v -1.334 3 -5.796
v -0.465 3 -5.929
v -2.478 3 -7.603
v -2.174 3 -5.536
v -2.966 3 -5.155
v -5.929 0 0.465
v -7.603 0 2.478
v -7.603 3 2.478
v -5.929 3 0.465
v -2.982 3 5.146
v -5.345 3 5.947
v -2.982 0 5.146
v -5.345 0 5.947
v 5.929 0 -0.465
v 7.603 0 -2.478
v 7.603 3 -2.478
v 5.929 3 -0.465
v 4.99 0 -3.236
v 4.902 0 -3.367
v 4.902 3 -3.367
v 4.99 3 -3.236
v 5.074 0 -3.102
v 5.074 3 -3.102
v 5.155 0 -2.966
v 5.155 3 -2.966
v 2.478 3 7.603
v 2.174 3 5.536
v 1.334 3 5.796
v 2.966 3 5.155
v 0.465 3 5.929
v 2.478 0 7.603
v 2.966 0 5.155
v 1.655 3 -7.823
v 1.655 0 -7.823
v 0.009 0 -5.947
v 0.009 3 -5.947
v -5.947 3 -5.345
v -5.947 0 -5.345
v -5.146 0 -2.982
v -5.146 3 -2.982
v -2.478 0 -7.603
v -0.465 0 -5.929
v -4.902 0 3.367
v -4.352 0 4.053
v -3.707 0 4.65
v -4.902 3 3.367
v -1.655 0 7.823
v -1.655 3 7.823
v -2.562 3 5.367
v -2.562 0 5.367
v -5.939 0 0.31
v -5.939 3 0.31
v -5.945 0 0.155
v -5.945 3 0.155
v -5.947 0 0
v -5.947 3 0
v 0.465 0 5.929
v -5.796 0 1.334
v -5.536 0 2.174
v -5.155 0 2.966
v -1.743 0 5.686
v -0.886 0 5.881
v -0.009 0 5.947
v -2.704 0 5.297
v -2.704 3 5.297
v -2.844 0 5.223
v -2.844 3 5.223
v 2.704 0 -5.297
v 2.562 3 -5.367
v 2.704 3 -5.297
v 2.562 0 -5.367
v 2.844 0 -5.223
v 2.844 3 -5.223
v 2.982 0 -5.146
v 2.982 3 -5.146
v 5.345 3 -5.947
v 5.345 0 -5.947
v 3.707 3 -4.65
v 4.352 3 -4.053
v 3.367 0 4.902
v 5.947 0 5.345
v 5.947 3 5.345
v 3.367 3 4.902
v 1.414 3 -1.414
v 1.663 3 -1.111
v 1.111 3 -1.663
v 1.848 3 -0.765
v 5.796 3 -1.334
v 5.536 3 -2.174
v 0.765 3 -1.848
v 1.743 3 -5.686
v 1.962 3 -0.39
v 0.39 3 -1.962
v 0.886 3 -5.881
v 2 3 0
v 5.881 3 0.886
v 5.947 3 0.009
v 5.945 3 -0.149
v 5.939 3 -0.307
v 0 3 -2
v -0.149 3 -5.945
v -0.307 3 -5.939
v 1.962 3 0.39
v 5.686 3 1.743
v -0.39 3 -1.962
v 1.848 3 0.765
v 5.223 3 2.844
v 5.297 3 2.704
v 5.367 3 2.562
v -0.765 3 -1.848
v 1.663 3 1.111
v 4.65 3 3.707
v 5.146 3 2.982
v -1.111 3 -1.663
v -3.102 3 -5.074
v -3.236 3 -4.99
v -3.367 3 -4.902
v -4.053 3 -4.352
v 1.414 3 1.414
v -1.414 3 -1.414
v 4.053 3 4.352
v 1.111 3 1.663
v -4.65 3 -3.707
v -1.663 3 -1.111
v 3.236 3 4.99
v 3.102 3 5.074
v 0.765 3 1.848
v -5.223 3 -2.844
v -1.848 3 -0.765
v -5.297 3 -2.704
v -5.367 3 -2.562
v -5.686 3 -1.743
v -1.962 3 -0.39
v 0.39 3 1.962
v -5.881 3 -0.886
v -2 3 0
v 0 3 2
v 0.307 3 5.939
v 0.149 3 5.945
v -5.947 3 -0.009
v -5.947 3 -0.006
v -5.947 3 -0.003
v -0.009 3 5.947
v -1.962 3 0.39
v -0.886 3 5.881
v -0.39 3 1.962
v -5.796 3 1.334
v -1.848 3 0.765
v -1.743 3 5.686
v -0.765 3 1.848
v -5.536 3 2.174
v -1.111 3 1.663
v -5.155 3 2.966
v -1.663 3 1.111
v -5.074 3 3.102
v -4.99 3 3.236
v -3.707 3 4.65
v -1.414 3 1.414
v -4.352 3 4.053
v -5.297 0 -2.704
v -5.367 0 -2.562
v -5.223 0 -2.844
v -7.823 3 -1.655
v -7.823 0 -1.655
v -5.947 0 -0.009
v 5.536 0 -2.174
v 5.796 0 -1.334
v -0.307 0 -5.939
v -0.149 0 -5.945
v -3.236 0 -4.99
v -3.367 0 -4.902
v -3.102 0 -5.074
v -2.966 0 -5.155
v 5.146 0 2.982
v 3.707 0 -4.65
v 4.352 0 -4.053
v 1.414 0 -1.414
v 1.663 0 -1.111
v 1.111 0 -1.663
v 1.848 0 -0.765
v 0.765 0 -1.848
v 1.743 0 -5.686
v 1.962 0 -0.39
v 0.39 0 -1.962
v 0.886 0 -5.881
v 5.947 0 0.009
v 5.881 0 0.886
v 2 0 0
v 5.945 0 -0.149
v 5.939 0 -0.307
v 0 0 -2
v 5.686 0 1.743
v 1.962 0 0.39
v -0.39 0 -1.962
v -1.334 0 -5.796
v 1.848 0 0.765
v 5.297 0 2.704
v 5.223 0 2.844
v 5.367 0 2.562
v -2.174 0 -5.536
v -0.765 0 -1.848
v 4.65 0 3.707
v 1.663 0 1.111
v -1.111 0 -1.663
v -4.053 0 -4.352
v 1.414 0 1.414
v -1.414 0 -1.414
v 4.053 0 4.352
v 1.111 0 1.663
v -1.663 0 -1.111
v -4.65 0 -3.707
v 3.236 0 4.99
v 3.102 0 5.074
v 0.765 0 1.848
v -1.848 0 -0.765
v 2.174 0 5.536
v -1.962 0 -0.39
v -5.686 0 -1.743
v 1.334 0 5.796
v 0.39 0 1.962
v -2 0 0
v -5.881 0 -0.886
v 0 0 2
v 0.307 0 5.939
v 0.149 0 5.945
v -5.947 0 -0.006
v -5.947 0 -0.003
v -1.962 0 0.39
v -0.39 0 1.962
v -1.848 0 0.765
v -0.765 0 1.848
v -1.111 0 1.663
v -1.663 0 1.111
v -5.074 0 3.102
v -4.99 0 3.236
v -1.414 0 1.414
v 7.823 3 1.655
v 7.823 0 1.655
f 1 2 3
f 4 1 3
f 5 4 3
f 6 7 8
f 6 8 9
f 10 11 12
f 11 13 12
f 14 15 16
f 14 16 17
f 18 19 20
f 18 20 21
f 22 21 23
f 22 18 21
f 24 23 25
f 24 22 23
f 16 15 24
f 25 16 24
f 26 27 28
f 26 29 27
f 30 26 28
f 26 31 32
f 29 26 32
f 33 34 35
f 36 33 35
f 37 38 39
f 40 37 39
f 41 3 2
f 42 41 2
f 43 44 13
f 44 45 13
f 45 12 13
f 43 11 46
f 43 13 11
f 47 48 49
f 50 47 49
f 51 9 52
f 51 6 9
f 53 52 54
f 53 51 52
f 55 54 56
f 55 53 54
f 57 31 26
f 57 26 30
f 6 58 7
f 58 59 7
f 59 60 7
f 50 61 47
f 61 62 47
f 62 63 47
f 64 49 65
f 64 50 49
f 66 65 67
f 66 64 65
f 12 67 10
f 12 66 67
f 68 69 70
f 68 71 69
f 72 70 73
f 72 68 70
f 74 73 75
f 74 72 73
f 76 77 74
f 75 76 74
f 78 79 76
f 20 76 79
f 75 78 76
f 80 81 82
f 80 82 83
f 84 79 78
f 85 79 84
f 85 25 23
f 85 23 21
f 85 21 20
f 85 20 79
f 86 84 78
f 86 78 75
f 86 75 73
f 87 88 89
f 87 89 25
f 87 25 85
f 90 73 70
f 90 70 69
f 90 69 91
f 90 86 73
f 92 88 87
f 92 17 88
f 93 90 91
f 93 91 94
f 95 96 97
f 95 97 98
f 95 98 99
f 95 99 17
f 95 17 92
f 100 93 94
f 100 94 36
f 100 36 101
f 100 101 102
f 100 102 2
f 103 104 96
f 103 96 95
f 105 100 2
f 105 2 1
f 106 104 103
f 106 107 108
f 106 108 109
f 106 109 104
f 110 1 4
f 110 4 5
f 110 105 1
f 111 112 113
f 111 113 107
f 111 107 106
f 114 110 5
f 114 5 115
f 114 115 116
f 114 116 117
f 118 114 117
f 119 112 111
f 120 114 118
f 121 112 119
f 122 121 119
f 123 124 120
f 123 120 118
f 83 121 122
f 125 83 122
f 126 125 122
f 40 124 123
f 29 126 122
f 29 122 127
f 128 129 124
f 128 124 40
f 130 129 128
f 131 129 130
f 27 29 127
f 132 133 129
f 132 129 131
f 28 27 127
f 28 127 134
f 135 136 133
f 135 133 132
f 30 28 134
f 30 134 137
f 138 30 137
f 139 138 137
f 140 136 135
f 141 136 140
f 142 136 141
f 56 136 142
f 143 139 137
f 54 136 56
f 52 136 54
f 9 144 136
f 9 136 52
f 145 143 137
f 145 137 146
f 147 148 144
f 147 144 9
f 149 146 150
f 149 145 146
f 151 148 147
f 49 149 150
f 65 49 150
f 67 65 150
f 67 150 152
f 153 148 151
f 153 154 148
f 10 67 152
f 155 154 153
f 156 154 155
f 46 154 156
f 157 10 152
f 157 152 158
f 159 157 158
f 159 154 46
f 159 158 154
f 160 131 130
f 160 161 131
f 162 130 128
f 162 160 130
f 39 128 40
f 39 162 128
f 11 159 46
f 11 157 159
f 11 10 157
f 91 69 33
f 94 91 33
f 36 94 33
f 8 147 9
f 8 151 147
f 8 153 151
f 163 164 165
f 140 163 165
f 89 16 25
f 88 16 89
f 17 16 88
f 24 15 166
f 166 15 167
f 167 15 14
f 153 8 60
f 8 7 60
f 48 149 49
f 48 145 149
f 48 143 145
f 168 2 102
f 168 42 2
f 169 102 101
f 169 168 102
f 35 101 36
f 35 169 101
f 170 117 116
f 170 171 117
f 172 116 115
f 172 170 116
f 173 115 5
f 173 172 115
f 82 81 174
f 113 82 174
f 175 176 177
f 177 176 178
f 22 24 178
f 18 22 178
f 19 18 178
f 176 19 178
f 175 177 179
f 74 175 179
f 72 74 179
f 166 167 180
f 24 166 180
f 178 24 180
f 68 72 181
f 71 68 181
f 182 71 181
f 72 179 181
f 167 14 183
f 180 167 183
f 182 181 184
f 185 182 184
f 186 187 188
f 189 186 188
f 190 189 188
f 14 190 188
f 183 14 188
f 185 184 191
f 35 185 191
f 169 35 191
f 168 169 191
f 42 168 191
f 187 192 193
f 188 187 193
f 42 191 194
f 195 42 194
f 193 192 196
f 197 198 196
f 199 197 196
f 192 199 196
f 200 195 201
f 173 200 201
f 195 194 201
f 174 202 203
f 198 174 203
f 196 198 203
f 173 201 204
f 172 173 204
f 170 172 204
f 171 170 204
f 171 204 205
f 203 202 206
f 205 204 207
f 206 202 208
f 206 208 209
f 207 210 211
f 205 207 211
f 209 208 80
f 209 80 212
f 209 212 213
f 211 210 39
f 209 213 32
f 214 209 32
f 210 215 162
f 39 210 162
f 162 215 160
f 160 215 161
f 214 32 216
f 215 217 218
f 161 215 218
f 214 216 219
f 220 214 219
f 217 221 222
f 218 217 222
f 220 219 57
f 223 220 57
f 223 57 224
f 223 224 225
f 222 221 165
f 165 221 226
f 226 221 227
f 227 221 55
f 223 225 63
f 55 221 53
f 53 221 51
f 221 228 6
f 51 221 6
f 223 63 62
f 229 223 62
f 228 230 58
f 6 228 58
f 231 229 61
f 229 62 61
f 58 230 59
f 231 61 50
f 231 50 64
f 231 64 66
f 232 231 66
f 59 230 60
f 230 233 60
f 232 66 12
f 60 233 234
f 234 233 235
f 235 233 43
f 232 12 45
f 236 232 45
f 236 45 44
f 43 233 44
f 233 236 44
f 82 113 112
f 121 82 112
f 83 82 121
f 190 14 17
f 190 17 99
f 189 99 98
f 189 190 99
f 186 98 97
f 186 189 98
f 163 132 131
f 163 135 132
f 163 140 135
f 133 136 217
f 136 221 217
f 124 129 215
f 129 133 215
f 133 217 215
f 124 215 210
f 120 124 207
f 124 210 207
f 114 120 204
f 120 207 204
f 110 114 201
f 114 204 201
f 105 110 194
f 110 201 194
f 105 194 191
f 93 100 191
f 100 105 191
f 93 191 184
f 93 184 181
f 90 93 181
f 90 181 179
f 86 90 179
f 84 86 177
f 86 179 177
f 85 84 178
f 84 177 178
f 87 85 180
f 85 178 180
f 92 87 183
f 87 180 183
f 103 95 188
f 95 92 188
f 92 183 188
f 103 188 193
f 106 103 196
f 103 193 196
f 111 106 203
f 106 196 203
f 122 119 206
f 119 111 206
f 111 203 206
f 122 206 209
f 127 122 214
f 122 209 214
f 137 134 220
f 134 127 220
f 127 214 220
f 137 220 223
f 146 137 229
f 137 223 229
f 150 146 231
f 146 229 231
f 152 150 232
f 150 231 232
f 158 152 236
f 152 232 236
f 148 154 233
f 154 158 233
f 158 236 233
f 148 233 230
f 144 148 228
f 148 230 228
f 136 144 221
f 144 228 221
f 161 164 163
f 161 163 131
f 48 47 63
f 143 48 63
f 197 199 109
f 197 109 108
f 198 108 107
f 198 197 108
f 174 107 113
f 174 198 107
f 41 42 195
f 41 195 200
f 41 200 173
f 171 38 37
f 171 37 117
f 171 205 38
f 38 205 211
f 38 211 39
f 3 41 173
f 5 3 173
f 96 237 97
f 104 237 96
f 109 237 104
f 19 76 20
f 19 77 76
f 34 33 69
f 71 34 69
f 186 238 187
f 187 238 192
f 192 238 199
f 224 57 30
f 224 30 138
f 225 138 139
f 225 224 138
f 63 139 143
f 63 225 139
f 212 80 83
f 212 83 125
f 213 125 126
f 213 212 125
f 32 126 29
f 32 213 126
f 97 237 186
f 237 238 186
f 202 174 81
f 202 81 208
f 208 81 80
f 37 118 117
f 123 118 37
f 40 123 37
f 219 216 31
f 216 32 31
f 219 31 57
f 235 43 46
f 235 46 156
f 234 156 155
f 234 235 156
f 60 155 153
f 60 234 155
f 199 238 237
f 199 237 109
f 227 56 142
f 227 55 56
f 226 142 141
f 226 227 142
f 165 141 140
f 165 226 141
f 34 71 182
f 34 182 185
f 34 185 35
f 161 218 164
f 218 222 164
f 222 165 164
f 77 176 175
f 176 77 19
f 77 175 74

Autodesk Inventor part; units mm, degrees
ref_plane "YZ Plane" through (0, 0, 0) normal (1, 0, 0) x (0, 1, 0)
ref_plane "XZ Plane" through (0, 0, 0) normal (0, 1, 0) x (-1, 0, 0)
ref_plane "XY Plane" through (0, 0, 0) normal (0, 0, 1) x (1, 0, 0)
sketch "Sketch1" plane through (0, 0, 0) normal (0, 1, 0) x (-1, 0, 0)
  circle A0 centre (0, 0) radius 2
  circle A1 centre (0, 0) radius 5.9473
  line L0 (5.3451, 5.9473) -> (2.9816, 5.146)
  line L1 (5.3451, 5.9473) -> (4.9023, 3.3673)
  line L2 (1.6553, 7.8231) -> (0.0091, 5.9473)
  line L3 (1.6553, 7.8231) -> (2.5618, 5.3673)
  line L4 (-2.478, 7.6027) -> (-2.9658, 5.1551)
  line L5 (-2.478, 7.6027) -> (-0.465, 5.9291)
  line L6 (-5.9473, 5.3451) -> (-5.146, 2.9816)
  line L7 (-5.9473, 5.3451) -> (-3.3673, 4.9023)
  line L8 (-7.8231, 1.6553) -> (-5.9473, 0.0091)
  line L9 (-7.8231, 1.6553) -> (-5.3673, 2.5618)
  line L10 (-7.6027, -2.478) -> (-5.1551, -2.9658)
  line L11 (-7.6027, -2.478) -> (-5.9291, -0.465)
  line L12 (-5.3451, -5.9473) -> (-2.9816, -5.146)
  line L13 (-5.3451, -5.9473) -> (-4.9023, -3.3673)
  line L14 (-1.6553, -7.8231) -> (-0.0091, -5.9473)
  line L15 (-1.6553, -7.8231) -> (-2.5618, -5.3673)
  line L16 (2.478, -7.6027) -> (2.9658, -5.1551)
  line L17 (2.478, -7.6027) -> (0.465, -5.9291)
  line L18 (5.9473, -5.3451) -> (5.146, -2.9816)
  line L19 (5.9473, -5.3451) -> (3.3673, -4.9023)
  line L20 (7.8231, -1.6553) -> (5.9473, -0.0091)
  line L21 (7.8231, -1.6553) -> (5.3673, -2.5618)
  line L22 (7.6027, 2.478) -> (5.1551, 2.9658)
  line L23 (7.6027, 2.478) -> (5.9291, 0.465)
  dimension "d0" = 4
  dimension "d3" = 360
extrude "Extrusion1" add sketch "Sketch1" along normal blind 3
properties part number "gir"
